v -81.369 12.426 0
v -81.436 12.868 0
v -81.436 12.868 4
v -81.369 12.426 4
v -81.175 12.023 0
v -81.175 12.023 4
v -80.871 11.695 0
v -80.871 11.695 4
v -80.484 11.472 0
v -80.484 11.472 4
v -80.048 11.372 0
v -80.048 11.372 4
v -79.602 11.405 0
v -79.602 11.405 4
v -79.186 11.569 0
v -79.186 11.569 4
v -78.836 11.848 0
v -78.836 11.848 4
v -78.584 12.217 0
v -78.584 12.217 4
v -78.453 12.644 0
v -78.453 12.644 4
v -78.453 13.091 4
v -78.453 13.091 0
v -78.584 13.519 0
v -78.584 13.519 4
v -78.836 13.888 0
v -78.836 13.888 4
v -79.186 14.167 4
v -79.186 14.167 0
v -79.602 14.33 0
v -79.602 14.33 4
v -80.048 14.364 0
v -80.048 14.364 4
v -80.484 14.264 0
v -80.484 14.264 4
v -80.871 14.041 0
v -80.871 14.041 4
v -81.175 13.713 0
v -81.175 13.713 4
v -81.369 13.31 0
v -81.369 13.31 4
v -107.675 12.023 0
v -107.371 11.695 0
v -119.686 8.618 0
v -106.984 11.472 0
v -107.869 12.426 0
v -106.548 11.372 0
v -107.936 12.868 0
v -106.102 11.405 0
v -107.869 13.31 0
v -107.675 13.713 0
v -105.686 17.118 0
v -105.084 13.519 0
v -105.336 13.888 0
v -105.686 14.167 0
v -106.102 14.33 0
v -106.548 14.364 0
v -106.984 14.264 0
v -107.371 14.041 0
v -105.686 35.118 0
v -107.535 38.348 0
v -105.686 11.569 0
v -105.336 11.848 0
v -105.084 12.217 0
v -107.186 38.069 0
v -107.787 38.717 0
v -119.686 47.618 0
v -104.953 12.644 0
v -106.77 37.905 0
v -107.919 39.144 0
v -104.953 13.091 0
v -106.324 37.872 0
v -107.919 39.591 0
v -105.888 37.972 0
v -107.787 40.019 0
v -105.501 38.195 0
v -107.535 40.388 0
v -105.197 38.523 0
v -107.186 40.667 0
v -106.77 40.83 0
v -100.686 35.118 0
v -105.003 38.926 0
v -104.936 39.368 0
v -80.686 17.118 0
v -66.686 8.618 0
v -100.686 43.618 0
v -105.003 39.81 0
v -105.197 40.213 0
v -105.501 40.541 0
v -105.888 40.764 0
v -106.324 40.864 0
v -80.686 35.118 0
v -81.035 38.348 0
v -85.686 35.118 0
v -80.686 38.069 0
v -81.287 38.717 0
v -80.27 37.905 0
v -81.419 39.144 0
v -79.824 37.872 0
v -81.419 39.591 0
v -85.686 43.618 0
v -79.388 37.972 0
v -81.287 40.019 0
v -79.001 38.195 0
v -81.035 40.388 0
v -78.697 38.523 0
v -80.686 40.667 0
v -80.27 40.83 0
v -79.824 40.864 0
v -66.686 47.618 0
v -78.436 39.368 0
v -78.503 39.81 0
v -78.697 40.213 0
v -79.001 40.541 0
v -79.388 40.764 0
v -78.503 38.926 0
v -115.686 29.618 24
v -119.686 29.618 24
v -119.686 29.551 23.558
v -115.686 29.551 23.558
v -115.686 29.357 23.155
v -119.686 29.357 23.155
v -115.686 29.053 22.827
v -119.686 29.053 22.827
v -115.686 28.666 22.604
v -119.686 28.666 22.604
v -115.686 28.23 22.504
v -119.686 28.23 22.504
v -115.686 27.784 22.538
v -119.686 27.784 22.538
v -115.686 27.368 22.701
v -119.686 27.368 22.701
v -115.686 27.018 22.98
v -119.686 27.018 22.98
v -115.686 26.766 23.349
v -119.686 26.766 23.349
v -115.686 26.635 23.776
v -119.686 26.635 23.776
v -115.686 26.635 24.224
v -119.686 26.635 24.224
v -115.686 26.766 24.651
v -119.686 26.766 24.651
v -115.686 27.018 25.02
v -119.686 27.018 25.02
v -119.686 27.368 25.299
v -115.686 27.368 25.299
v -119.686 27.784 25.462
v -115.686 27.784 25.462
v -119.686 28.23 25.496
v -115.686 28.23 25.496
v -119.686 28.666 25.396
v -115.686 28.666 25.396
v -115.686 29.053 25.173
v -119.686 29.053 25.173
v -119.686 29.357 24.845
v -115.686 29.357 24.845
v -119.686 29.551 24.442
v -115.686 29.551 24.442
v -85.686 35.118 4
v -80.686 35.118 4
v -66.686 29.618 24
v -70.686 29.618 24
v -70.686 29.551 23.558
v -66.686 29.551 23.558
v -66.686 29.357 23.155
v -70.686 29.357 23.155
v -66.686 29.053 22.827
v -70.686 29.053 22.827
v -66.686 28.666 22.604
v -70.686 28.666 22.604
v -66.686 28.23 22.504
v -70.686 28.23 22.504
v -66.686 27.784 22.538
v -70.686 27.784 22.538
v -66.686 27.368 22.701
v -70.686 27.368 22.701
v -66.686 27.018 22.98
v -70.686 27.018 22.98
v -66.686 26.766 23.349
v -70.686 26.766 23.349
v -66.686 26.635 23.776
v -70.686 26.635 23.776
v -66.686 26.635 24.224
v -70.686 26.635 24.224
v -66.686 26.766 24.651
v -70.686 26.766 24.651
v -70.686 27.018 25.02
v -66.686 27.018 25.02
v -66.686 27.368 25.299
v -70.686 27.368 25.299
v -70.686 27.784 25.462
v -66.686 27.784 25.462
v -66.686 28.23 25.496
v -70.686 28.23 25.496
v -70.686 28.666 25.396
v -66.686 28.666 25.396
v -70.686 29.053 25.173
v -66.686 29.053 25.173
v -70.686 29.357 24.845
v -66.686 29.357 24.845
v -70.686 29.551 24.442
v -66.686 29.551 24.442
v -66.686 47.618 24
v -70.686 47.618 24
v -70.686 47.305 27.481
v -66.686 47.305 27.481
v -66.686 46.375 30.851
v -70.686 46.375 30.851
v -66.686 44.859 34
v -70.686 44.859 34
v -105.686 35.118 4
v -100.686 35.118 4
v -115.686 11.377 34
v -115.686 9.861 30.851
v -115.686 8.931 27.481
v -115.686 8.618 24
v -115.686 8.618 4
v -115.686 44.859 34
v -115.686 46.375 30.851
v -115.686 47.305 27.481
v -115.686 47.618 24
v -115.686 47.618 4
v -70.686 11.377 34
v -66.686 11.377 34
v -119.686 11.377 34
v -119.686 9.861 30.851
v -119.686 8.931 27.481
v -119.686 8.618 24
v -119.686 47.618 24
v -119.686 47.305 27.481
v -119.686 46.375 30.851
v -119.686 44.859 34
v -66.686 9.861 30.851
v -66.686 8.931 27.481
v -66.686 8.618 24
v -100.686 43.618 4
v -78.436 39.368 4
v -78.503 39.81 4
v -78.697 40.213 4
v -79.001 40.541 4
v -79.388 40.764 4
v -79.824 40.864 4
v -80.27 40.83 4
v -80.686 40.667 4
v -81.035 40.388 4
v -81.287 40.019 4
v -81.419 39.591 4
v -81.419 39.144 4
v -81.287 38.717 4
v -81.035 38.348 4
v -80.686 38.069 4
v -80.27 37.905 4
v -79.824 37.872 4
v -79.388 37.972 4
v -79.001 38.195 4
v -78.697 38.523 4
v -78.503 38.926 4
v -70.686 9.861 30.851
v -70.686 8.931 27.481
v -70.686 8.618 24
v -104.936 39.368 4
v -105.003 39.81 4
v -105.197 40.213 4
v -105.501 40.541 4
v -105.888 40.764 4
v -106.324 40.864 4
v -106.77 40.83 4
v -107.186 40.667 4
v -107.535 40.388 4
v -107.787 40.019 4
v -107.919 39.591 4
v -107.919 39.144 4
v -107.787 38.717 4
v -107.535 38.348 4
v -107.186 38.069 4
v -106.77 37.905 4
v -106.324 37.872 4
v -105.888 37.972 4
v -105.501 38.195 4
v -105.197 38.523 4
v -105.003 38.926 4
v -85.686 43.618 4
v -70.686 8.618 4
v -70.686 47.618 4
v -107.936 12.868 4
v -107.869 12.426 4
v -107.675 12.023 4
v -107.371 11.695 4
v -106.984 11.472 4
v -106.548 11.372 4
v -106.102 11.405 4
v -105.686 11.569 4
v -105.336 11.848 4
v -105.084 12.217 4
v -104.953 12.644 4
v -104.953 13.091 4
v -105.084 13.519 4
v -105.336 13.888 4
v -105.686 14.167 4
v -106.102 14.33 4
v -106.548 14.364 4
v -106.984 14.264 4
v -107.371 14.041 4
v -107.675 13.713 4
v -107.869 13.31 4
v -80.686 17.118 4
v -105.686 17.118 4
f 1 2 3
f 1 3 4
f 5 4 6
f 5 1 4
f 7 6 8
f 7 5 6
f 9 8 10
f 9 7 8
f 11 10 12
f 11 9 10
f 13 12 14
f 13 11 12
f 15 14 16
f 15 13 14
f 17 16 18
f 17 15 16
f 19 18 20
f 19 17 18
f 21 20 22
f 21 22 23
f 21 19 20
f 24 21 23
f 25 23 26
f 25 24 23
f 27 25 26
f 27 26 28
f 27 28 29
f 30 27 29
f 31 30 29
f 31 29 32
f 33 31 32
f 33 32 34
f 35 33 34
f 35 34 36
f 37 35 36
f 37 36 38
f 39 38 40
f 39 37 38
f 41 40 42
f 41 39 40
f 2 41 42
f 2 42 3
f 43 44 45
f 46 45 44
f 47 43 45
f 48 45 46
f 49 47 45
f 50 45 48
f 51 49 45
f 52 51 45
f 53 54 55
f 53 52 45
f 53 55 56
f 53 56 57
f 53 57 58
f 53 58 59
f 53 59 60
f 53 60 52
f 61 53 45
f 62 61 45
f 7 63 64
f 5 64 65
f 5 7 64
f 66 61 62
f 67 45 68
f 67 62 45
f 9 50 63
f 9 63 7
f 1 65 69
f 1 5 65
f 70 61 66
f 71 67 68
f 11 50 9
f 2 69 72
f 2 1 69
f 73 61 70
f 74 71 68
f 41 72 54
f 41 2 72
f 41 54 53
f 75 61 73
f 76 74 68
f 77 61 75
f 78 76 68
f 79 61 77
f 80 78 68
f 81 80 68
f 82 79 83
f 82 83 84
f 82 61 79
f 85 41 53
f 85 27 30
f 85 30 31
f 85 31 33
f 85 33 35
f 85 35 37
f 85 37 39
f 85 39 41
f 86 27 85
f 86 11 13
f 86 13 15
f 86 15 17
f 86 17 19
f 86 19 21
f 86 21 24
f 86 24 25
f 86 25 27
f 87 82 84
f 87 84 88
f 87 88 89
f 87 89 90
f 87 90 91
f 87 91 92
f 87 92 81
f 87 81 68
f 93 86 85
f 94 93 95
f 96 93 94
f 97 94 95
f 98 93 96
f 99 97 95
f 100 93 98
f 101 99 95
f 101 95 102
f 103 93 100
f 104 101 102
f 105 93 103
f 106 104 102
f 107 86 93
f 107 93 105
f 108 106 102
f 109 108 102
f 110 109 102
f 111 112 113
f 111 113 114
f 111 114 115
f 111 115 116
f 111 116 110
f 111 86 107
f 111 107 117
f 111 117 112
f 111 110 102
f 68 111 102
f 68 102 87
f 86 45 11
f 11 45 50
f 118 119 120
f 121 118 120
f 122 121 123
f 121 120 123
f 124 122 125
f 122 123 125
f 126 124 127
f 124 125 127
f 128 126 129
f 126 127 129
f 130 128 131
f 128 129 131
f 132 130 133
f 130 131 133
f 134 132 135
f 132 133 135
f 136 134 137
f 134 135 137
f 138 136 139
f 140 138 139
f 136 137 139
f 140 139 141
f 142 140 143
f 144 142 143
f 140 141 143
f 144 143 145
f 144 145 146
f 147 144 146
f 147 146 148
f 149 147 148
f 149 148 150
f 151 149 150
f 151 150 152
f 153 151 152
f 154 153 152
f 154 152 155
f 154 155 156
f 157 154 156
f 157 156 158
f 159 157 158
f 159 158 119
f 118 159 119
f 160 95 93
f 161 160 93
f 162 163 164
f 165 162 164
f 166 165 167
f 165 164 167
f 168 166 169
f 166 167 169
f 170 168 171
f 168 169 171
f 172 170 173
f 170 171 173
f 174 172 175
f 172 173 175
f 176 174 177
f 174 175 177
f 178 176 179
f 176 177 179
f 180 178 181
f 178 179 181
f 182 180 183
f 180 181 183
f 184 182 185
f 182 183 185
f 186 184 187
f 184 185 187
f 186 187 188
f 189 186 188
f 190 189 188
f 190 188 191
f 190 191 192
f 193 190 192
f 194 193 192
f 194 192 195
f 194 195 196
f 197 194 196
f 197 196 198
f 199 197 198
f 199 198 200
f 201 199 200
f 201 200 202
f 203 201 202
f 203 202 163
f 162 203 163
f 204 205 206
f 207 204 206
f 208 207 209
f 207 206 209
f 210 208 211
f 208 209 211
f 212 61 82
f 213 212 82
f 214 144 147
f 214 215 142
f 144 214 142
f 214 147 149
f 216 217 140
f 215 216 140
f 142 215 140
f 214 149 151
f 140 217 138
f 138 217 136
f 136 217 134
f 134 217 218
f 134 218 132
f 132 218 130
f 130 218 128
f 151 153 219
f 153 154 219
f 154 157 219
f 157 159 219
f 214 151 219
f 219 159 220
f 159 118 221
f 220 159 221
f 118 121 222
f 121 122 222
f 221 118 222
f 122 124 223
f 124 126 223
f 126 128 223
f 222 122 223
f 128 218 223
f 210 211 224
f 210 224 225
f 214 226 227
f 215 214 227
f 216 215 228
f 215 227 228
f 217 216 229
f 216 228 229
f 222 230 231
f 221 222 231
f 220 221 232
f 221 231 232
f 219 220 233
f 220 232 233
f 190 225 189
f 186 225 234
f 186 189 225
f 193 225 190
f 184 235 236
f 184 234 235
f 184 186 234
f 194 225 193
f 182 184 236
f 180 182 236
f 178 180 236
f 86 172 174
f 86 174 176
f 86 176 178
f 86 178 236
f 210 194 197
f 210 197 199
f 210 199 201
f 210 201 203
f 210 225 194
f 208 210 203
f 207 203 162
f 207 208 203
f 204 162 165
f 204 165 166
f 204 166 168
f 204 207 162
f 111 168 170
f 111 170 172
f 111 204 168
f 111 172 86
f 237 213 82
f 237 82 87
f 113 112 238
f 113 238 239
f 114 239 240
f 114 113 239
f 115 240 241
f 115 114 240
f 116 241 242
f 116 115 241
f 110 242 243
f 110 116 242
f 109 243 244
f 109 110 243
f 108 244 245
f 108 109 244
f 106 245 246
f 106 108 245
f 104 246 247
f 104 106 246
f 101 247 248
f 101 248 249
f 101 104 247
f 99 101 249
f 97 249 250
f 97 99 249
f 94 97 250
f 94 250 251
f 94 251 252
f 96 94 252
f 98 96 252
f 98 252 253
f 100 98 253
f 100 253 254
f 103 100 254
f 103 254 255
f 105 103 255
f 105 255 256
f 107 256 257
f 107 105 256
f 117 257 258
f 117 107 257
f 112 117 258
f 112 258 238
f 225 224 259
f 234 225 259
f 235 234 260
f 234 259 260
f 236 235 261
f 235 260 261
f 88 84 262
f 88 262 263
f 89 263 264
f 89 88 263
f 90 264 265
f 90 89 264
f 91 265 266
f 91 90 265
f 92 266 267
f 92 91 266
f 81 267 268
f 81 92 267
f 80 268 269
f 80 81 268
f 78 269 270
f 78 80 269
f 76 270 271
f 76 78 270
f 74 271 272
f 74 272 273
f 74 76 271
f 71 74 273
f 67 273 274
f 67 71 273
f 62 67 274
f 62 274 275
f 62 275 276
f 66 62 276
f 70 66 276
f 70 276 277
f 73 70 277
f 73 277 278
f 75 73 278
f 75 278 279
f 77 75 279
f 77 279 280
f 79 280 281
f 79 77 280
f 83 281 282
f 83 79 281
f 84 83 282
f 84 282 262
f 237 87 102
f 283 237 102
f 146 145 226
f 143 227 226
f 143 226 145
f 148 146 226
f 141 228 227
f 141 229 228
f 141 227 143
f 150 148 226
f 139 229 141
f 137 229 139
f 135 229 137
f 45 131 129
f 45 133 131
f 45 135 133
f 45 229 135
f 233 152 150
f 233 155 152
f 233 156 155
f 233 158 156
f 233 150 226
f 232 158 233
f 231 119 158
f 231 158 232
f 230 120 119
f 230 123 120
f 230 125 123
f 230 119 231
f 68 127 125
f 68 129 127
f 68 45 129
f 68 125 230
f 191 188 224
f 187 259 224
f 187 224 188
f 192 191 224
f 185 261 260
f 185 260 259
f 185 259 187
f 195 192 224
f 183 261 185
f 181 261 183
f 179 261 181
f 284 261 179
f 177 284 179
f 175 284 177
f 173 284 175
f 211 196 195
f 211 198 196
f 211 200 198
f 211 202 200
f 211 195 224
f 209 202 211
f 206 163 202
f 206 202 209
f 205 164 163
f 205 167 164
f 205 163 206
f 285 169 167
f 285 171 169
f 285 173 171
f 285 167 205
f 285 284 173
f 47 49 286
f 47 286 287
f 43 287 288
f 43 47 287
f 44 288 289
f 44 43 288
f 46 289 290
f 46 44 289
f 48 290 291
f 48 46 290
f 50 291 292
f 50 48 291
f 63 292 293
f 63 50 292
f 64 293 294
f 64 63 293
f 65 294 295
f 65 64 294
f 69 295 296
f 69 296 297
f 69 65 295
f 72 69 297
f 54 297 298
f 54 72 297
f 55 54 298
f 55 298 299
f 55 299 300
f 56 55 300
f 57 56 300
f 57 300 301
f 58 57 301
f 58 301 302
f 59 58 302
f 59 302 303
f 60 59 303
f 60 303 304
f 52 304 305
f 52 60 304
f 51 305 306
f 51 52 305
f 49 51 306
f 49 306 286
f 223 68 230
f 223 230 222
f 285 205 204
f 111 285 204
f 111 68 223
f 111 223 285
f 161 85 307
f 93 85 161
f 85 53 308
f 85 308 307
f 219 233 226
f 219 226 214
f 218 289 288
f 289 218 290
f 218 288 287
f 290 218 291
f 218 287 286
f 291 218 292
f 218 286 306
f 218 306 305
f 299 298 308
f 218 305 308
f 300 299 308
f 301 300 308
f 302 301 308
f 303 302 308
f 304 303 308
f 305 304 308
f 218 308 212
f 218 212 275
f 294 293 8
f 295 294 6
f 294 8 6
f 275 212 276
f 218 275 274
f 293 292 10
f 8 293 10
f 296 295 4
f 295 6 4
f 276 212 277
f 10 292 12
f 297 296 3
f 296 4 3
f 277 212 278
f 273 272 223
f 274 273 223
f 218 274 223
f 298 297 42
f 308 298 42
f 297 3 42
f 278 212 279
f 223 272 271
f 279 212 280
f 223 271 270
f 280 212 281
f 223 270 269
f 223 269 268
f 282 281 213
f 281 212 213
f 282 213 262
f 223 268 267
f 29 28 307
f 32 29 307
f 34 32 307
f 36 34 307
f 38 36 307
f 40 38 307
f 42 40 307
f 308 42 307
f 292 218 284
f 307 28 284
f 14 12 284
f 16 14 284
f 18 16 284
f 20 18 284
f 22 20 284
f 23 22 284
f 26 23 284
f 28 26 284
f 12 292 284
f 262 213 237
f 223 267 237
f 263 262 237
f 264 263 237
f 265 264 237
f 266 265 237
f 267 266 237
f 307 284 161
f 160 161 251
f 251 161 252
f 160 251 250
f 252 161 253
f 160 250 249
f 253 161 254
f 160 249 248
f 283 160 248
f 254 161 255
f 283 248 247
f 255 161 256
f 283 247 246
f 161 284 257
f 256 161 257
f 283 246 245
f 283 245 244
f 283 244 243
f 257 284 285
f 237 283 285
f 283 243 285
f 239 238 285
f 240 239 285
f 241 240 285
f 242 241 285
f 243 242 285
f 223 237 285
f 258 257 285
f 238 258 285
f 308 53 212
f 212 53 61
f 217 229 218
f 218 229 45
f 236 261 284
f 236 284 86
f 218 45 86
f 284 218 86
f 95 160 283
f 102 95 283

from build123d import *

# Parameters (mm, degrees)
SKETCH_1_W          = 35
SKETCH_1_H          = 35
SKETCH_1_R          = 1.5
SKETCH_1_W_2        = 25
SKETCH_1_H_2        = 18
EXTRUDE_2_DEPTH     = 4
SKETCH_2_W          = 15
SKETCH_2_H          = 9
CUT_EXTRUDE_1_DEPTH = 4
SKETCH_3_W          = 35
SKETCH_3_H          = 4
EXTRUDE_3_DEPTH     = 4
SKETCH_4_W          = 4
SKETCH_4_H          = 39
EXTRUDE_4_DEPTH     = 9
SKETCH_5_W          = 4
SKETCH_5_H          = 39
EXTRUDE_5_DEPTH     = 9
SKETCH_6_W          = 4
SKETCH_6_H          = 39
EXTRUDE_6_DEPTH     = 30
CUT_EXTRUDE_2_REACH = 80.946
SKETCH_7_R          = 1.5
CUT_EXTRUDE_3_REACH = 80.946


with BuildPart() as part:
    # 草图1 → 凸台-拉伸2 (new body)
    with BuildSketch(Plane.XY):
        with Locations((-93.185913744, 26.117851257)):
            Rectangle(SKETCH_1_W, SKETCH_1_H)
        with Locations((-106.435913744, 39.367851257)):
            Circle(SKETCH_1_R, mode=Mode.SUBTRACT)
        with Locations(Location((-79.935913744, 12.867851257, 0), (0, 0, 180))):
            Circle(SKETCH_1_R, mode=Mode.SUBTRACT)
        with Locations((-79.935913744, 39.367851257)):
            Circle(SKETCH_1_R, mode=Mode.SUBTRACT)
        with Locations(Location((-106.435913744, 12.867851257, 0), (0, 0, 180))):
            Circle(SKETCH_1_R, mode=Mode.SUBTRACT)
        with Locations((-93.185913744, 26.117851257)):
            Rectangle(SKETCH_1_W_2, SKETCH_1_H_2, mode=Mode.SUBTRACT)
    extrude(amount=EXTRUDE_2_DEPTH)

    # 草图2 → 切除-拉伸1 (cut)
    with BuildSketch(Plane.XY.offset(4)):
        with Locations((-93.185913744, 39.117851257)):
            Rectangle(SKETCH_2_W, SKETCH_2_H)
    extrude(amount=-CUT_EXTRUDE_1_DEPTH, mode=Mode.SUBTRACT)

    # 草图3 → 凸台-拉伸3 (add)
    with BuildSketch(Plane(origin=(0, 43.617851257, 0), x_dir=(1, 0, 0), z_dir=(0, 1, 0))):
        with Locations((-93.185913744, -2)):
            Rectangle(SKETCH_3_W, SKETCH_3_H)
    extrude(amount=EXTRUDE_3_DEPTH)

    # 草图4 → 凸台-拉伸4 (add)
    with BuildSketch(Plane(origin=(-75.685913744, 0, 0), x_dir=(0, 0, -1), z_dir=(1, 0, 0))):
        with Locations((-2, 28.117851257)):
            Rectangle(SKETCH_4_W, SKETCH_4_H)
    extrude(amount=EXTRUDE_4_DEPTH)

    # 草图5 → 凸台-拉伸5 (add)
    with BuildSketch(Plane.ZY.offset(110.685913744)):
        with Locations((2, 28.117851257)):
            Rectangle(SKETCH_5_W, SKETCH_5_H)
    extrude(amount=EXTRUDE_5_DEPTH)

    # 草图6 → 凸台-拉伸6 (add)
    with BuildSketch(Plane.XY.offset(4)):
        with Locations((-117.685913744, 28.117851257)):
            Rectangle(SKETCH_6_W, SKETCH_6_H)
        with Locations((-68.685913744, 28.117851257)):
            Rectangle(SKETCH_6_W, SKETCH_6_H)
    extrude(amount=EXTRUDE_6_DEPTH)

    # 切除-拉伸2: up to this face of the body (flat: up to its plane)
    cut_extrude_2_end = Plane(part.part.faces().sort_by_distance((-66.685913744, 28.117851257, 17))[0])
    # 草图7 → 切除-拉伸2 (cut, up to the picked face)
    with BuildSketch(Plane.ZY.offset(119.685913744), mode=Mode.PRIVATE) as cut_extrude_2_sk1:
        with Locations(Location((24, 28.117851257, 0), (0, 0, 90))):
            Circle(SKETCH_7_R)
    cut_extrude_2_tool1 = split(extrude(cut_extrude_2_sk1.sketch, amount=-CUT_EXTRUDE_2_REACH, mode=Mode.PRIVATE), bisect_by=cut_extrude_2_end, keep=Keep.BOTH, mode=Mode.PRIVATE)
    add(cut_extrude_2_tool1.solids().sort_by(Axis((-119.685914, 28.117851, 24), (1, 0, 0)))[0], mode=Mode.SUBTRACT)

    # 切除-拉伸3: up to this face of the body (flat: up to its plane)
    cut_extrude_3_end = Plane(part.part.faces().sort_by_distance((-66.685913744, 28.117851257, 16.962484718))[0])
    # 草图9 → 切除-拉伸3 (cut, up to the picked face)
    with BuildSketch(Plane.ZY.offset(119.685913744), mode=Mode.PRIVATE) as cut_extrude_3_sk1:
        with BuildLine():
            Line((34, 44.8585203), (34, 47.617851257))
            Line((34, 47.617851257), (24, 47.617851257))
            ThreePointArc((24, 47.617851257), (29.186856161, 46.915365007), (34, 44.8585203))
        make_face()
    cut_extrude_3_tool1 = split(extrude(cut_extrude_3_sk1.sketch, amount=-CUT_EXTRUDE_3_REACH, mode=Mode.PRIVATE), bisect_by=cut_extrude_3_end, keep=Keep.BOTH, mode=Mode.PRIVATE)
    # 草图9 → 切除-拉伸3 (cut, up to the picked face)
    with BuildSketch(Plane.ZY.offset(119.685913744), mode=Mode.PRIVATE) as cut_extrude_3_sk2:
        with BuildLine():
            ThreePointArc((34, 11.377182214), (29.186856161, 9.320337507), (24, 8.617851257))
            Line((24, 8.617851257), (34, 8.617851257))
            Line((34, 8.617851257), (34, 11.377182214))
        make_face()
    cut_extrude_3_tool2 = split(extrude(cut_extrude_3_sk2.sketch, amount=-CUT_EXTRUDE_3_REACH, mode=Mode.PRIVATE), bisect_by=cut_extrude_3_end, keep=Keep.BOTH, mode=Mode.PRIVATE)
    add(cut_extrude_3_tool1.solids().sort_by(Axis((-119.685914, 46.80116, 31.536753), (1, 0, 0)))[0], mode=Mode.SUBTRACT)
    add(cut_extrude_3_tool2.solids().sort_by(Axis((-119.685914, 9.434542, 31.536753), (1, 0, 0)))[0], mode=Mode.SUBTRACT)


solid = part.part
